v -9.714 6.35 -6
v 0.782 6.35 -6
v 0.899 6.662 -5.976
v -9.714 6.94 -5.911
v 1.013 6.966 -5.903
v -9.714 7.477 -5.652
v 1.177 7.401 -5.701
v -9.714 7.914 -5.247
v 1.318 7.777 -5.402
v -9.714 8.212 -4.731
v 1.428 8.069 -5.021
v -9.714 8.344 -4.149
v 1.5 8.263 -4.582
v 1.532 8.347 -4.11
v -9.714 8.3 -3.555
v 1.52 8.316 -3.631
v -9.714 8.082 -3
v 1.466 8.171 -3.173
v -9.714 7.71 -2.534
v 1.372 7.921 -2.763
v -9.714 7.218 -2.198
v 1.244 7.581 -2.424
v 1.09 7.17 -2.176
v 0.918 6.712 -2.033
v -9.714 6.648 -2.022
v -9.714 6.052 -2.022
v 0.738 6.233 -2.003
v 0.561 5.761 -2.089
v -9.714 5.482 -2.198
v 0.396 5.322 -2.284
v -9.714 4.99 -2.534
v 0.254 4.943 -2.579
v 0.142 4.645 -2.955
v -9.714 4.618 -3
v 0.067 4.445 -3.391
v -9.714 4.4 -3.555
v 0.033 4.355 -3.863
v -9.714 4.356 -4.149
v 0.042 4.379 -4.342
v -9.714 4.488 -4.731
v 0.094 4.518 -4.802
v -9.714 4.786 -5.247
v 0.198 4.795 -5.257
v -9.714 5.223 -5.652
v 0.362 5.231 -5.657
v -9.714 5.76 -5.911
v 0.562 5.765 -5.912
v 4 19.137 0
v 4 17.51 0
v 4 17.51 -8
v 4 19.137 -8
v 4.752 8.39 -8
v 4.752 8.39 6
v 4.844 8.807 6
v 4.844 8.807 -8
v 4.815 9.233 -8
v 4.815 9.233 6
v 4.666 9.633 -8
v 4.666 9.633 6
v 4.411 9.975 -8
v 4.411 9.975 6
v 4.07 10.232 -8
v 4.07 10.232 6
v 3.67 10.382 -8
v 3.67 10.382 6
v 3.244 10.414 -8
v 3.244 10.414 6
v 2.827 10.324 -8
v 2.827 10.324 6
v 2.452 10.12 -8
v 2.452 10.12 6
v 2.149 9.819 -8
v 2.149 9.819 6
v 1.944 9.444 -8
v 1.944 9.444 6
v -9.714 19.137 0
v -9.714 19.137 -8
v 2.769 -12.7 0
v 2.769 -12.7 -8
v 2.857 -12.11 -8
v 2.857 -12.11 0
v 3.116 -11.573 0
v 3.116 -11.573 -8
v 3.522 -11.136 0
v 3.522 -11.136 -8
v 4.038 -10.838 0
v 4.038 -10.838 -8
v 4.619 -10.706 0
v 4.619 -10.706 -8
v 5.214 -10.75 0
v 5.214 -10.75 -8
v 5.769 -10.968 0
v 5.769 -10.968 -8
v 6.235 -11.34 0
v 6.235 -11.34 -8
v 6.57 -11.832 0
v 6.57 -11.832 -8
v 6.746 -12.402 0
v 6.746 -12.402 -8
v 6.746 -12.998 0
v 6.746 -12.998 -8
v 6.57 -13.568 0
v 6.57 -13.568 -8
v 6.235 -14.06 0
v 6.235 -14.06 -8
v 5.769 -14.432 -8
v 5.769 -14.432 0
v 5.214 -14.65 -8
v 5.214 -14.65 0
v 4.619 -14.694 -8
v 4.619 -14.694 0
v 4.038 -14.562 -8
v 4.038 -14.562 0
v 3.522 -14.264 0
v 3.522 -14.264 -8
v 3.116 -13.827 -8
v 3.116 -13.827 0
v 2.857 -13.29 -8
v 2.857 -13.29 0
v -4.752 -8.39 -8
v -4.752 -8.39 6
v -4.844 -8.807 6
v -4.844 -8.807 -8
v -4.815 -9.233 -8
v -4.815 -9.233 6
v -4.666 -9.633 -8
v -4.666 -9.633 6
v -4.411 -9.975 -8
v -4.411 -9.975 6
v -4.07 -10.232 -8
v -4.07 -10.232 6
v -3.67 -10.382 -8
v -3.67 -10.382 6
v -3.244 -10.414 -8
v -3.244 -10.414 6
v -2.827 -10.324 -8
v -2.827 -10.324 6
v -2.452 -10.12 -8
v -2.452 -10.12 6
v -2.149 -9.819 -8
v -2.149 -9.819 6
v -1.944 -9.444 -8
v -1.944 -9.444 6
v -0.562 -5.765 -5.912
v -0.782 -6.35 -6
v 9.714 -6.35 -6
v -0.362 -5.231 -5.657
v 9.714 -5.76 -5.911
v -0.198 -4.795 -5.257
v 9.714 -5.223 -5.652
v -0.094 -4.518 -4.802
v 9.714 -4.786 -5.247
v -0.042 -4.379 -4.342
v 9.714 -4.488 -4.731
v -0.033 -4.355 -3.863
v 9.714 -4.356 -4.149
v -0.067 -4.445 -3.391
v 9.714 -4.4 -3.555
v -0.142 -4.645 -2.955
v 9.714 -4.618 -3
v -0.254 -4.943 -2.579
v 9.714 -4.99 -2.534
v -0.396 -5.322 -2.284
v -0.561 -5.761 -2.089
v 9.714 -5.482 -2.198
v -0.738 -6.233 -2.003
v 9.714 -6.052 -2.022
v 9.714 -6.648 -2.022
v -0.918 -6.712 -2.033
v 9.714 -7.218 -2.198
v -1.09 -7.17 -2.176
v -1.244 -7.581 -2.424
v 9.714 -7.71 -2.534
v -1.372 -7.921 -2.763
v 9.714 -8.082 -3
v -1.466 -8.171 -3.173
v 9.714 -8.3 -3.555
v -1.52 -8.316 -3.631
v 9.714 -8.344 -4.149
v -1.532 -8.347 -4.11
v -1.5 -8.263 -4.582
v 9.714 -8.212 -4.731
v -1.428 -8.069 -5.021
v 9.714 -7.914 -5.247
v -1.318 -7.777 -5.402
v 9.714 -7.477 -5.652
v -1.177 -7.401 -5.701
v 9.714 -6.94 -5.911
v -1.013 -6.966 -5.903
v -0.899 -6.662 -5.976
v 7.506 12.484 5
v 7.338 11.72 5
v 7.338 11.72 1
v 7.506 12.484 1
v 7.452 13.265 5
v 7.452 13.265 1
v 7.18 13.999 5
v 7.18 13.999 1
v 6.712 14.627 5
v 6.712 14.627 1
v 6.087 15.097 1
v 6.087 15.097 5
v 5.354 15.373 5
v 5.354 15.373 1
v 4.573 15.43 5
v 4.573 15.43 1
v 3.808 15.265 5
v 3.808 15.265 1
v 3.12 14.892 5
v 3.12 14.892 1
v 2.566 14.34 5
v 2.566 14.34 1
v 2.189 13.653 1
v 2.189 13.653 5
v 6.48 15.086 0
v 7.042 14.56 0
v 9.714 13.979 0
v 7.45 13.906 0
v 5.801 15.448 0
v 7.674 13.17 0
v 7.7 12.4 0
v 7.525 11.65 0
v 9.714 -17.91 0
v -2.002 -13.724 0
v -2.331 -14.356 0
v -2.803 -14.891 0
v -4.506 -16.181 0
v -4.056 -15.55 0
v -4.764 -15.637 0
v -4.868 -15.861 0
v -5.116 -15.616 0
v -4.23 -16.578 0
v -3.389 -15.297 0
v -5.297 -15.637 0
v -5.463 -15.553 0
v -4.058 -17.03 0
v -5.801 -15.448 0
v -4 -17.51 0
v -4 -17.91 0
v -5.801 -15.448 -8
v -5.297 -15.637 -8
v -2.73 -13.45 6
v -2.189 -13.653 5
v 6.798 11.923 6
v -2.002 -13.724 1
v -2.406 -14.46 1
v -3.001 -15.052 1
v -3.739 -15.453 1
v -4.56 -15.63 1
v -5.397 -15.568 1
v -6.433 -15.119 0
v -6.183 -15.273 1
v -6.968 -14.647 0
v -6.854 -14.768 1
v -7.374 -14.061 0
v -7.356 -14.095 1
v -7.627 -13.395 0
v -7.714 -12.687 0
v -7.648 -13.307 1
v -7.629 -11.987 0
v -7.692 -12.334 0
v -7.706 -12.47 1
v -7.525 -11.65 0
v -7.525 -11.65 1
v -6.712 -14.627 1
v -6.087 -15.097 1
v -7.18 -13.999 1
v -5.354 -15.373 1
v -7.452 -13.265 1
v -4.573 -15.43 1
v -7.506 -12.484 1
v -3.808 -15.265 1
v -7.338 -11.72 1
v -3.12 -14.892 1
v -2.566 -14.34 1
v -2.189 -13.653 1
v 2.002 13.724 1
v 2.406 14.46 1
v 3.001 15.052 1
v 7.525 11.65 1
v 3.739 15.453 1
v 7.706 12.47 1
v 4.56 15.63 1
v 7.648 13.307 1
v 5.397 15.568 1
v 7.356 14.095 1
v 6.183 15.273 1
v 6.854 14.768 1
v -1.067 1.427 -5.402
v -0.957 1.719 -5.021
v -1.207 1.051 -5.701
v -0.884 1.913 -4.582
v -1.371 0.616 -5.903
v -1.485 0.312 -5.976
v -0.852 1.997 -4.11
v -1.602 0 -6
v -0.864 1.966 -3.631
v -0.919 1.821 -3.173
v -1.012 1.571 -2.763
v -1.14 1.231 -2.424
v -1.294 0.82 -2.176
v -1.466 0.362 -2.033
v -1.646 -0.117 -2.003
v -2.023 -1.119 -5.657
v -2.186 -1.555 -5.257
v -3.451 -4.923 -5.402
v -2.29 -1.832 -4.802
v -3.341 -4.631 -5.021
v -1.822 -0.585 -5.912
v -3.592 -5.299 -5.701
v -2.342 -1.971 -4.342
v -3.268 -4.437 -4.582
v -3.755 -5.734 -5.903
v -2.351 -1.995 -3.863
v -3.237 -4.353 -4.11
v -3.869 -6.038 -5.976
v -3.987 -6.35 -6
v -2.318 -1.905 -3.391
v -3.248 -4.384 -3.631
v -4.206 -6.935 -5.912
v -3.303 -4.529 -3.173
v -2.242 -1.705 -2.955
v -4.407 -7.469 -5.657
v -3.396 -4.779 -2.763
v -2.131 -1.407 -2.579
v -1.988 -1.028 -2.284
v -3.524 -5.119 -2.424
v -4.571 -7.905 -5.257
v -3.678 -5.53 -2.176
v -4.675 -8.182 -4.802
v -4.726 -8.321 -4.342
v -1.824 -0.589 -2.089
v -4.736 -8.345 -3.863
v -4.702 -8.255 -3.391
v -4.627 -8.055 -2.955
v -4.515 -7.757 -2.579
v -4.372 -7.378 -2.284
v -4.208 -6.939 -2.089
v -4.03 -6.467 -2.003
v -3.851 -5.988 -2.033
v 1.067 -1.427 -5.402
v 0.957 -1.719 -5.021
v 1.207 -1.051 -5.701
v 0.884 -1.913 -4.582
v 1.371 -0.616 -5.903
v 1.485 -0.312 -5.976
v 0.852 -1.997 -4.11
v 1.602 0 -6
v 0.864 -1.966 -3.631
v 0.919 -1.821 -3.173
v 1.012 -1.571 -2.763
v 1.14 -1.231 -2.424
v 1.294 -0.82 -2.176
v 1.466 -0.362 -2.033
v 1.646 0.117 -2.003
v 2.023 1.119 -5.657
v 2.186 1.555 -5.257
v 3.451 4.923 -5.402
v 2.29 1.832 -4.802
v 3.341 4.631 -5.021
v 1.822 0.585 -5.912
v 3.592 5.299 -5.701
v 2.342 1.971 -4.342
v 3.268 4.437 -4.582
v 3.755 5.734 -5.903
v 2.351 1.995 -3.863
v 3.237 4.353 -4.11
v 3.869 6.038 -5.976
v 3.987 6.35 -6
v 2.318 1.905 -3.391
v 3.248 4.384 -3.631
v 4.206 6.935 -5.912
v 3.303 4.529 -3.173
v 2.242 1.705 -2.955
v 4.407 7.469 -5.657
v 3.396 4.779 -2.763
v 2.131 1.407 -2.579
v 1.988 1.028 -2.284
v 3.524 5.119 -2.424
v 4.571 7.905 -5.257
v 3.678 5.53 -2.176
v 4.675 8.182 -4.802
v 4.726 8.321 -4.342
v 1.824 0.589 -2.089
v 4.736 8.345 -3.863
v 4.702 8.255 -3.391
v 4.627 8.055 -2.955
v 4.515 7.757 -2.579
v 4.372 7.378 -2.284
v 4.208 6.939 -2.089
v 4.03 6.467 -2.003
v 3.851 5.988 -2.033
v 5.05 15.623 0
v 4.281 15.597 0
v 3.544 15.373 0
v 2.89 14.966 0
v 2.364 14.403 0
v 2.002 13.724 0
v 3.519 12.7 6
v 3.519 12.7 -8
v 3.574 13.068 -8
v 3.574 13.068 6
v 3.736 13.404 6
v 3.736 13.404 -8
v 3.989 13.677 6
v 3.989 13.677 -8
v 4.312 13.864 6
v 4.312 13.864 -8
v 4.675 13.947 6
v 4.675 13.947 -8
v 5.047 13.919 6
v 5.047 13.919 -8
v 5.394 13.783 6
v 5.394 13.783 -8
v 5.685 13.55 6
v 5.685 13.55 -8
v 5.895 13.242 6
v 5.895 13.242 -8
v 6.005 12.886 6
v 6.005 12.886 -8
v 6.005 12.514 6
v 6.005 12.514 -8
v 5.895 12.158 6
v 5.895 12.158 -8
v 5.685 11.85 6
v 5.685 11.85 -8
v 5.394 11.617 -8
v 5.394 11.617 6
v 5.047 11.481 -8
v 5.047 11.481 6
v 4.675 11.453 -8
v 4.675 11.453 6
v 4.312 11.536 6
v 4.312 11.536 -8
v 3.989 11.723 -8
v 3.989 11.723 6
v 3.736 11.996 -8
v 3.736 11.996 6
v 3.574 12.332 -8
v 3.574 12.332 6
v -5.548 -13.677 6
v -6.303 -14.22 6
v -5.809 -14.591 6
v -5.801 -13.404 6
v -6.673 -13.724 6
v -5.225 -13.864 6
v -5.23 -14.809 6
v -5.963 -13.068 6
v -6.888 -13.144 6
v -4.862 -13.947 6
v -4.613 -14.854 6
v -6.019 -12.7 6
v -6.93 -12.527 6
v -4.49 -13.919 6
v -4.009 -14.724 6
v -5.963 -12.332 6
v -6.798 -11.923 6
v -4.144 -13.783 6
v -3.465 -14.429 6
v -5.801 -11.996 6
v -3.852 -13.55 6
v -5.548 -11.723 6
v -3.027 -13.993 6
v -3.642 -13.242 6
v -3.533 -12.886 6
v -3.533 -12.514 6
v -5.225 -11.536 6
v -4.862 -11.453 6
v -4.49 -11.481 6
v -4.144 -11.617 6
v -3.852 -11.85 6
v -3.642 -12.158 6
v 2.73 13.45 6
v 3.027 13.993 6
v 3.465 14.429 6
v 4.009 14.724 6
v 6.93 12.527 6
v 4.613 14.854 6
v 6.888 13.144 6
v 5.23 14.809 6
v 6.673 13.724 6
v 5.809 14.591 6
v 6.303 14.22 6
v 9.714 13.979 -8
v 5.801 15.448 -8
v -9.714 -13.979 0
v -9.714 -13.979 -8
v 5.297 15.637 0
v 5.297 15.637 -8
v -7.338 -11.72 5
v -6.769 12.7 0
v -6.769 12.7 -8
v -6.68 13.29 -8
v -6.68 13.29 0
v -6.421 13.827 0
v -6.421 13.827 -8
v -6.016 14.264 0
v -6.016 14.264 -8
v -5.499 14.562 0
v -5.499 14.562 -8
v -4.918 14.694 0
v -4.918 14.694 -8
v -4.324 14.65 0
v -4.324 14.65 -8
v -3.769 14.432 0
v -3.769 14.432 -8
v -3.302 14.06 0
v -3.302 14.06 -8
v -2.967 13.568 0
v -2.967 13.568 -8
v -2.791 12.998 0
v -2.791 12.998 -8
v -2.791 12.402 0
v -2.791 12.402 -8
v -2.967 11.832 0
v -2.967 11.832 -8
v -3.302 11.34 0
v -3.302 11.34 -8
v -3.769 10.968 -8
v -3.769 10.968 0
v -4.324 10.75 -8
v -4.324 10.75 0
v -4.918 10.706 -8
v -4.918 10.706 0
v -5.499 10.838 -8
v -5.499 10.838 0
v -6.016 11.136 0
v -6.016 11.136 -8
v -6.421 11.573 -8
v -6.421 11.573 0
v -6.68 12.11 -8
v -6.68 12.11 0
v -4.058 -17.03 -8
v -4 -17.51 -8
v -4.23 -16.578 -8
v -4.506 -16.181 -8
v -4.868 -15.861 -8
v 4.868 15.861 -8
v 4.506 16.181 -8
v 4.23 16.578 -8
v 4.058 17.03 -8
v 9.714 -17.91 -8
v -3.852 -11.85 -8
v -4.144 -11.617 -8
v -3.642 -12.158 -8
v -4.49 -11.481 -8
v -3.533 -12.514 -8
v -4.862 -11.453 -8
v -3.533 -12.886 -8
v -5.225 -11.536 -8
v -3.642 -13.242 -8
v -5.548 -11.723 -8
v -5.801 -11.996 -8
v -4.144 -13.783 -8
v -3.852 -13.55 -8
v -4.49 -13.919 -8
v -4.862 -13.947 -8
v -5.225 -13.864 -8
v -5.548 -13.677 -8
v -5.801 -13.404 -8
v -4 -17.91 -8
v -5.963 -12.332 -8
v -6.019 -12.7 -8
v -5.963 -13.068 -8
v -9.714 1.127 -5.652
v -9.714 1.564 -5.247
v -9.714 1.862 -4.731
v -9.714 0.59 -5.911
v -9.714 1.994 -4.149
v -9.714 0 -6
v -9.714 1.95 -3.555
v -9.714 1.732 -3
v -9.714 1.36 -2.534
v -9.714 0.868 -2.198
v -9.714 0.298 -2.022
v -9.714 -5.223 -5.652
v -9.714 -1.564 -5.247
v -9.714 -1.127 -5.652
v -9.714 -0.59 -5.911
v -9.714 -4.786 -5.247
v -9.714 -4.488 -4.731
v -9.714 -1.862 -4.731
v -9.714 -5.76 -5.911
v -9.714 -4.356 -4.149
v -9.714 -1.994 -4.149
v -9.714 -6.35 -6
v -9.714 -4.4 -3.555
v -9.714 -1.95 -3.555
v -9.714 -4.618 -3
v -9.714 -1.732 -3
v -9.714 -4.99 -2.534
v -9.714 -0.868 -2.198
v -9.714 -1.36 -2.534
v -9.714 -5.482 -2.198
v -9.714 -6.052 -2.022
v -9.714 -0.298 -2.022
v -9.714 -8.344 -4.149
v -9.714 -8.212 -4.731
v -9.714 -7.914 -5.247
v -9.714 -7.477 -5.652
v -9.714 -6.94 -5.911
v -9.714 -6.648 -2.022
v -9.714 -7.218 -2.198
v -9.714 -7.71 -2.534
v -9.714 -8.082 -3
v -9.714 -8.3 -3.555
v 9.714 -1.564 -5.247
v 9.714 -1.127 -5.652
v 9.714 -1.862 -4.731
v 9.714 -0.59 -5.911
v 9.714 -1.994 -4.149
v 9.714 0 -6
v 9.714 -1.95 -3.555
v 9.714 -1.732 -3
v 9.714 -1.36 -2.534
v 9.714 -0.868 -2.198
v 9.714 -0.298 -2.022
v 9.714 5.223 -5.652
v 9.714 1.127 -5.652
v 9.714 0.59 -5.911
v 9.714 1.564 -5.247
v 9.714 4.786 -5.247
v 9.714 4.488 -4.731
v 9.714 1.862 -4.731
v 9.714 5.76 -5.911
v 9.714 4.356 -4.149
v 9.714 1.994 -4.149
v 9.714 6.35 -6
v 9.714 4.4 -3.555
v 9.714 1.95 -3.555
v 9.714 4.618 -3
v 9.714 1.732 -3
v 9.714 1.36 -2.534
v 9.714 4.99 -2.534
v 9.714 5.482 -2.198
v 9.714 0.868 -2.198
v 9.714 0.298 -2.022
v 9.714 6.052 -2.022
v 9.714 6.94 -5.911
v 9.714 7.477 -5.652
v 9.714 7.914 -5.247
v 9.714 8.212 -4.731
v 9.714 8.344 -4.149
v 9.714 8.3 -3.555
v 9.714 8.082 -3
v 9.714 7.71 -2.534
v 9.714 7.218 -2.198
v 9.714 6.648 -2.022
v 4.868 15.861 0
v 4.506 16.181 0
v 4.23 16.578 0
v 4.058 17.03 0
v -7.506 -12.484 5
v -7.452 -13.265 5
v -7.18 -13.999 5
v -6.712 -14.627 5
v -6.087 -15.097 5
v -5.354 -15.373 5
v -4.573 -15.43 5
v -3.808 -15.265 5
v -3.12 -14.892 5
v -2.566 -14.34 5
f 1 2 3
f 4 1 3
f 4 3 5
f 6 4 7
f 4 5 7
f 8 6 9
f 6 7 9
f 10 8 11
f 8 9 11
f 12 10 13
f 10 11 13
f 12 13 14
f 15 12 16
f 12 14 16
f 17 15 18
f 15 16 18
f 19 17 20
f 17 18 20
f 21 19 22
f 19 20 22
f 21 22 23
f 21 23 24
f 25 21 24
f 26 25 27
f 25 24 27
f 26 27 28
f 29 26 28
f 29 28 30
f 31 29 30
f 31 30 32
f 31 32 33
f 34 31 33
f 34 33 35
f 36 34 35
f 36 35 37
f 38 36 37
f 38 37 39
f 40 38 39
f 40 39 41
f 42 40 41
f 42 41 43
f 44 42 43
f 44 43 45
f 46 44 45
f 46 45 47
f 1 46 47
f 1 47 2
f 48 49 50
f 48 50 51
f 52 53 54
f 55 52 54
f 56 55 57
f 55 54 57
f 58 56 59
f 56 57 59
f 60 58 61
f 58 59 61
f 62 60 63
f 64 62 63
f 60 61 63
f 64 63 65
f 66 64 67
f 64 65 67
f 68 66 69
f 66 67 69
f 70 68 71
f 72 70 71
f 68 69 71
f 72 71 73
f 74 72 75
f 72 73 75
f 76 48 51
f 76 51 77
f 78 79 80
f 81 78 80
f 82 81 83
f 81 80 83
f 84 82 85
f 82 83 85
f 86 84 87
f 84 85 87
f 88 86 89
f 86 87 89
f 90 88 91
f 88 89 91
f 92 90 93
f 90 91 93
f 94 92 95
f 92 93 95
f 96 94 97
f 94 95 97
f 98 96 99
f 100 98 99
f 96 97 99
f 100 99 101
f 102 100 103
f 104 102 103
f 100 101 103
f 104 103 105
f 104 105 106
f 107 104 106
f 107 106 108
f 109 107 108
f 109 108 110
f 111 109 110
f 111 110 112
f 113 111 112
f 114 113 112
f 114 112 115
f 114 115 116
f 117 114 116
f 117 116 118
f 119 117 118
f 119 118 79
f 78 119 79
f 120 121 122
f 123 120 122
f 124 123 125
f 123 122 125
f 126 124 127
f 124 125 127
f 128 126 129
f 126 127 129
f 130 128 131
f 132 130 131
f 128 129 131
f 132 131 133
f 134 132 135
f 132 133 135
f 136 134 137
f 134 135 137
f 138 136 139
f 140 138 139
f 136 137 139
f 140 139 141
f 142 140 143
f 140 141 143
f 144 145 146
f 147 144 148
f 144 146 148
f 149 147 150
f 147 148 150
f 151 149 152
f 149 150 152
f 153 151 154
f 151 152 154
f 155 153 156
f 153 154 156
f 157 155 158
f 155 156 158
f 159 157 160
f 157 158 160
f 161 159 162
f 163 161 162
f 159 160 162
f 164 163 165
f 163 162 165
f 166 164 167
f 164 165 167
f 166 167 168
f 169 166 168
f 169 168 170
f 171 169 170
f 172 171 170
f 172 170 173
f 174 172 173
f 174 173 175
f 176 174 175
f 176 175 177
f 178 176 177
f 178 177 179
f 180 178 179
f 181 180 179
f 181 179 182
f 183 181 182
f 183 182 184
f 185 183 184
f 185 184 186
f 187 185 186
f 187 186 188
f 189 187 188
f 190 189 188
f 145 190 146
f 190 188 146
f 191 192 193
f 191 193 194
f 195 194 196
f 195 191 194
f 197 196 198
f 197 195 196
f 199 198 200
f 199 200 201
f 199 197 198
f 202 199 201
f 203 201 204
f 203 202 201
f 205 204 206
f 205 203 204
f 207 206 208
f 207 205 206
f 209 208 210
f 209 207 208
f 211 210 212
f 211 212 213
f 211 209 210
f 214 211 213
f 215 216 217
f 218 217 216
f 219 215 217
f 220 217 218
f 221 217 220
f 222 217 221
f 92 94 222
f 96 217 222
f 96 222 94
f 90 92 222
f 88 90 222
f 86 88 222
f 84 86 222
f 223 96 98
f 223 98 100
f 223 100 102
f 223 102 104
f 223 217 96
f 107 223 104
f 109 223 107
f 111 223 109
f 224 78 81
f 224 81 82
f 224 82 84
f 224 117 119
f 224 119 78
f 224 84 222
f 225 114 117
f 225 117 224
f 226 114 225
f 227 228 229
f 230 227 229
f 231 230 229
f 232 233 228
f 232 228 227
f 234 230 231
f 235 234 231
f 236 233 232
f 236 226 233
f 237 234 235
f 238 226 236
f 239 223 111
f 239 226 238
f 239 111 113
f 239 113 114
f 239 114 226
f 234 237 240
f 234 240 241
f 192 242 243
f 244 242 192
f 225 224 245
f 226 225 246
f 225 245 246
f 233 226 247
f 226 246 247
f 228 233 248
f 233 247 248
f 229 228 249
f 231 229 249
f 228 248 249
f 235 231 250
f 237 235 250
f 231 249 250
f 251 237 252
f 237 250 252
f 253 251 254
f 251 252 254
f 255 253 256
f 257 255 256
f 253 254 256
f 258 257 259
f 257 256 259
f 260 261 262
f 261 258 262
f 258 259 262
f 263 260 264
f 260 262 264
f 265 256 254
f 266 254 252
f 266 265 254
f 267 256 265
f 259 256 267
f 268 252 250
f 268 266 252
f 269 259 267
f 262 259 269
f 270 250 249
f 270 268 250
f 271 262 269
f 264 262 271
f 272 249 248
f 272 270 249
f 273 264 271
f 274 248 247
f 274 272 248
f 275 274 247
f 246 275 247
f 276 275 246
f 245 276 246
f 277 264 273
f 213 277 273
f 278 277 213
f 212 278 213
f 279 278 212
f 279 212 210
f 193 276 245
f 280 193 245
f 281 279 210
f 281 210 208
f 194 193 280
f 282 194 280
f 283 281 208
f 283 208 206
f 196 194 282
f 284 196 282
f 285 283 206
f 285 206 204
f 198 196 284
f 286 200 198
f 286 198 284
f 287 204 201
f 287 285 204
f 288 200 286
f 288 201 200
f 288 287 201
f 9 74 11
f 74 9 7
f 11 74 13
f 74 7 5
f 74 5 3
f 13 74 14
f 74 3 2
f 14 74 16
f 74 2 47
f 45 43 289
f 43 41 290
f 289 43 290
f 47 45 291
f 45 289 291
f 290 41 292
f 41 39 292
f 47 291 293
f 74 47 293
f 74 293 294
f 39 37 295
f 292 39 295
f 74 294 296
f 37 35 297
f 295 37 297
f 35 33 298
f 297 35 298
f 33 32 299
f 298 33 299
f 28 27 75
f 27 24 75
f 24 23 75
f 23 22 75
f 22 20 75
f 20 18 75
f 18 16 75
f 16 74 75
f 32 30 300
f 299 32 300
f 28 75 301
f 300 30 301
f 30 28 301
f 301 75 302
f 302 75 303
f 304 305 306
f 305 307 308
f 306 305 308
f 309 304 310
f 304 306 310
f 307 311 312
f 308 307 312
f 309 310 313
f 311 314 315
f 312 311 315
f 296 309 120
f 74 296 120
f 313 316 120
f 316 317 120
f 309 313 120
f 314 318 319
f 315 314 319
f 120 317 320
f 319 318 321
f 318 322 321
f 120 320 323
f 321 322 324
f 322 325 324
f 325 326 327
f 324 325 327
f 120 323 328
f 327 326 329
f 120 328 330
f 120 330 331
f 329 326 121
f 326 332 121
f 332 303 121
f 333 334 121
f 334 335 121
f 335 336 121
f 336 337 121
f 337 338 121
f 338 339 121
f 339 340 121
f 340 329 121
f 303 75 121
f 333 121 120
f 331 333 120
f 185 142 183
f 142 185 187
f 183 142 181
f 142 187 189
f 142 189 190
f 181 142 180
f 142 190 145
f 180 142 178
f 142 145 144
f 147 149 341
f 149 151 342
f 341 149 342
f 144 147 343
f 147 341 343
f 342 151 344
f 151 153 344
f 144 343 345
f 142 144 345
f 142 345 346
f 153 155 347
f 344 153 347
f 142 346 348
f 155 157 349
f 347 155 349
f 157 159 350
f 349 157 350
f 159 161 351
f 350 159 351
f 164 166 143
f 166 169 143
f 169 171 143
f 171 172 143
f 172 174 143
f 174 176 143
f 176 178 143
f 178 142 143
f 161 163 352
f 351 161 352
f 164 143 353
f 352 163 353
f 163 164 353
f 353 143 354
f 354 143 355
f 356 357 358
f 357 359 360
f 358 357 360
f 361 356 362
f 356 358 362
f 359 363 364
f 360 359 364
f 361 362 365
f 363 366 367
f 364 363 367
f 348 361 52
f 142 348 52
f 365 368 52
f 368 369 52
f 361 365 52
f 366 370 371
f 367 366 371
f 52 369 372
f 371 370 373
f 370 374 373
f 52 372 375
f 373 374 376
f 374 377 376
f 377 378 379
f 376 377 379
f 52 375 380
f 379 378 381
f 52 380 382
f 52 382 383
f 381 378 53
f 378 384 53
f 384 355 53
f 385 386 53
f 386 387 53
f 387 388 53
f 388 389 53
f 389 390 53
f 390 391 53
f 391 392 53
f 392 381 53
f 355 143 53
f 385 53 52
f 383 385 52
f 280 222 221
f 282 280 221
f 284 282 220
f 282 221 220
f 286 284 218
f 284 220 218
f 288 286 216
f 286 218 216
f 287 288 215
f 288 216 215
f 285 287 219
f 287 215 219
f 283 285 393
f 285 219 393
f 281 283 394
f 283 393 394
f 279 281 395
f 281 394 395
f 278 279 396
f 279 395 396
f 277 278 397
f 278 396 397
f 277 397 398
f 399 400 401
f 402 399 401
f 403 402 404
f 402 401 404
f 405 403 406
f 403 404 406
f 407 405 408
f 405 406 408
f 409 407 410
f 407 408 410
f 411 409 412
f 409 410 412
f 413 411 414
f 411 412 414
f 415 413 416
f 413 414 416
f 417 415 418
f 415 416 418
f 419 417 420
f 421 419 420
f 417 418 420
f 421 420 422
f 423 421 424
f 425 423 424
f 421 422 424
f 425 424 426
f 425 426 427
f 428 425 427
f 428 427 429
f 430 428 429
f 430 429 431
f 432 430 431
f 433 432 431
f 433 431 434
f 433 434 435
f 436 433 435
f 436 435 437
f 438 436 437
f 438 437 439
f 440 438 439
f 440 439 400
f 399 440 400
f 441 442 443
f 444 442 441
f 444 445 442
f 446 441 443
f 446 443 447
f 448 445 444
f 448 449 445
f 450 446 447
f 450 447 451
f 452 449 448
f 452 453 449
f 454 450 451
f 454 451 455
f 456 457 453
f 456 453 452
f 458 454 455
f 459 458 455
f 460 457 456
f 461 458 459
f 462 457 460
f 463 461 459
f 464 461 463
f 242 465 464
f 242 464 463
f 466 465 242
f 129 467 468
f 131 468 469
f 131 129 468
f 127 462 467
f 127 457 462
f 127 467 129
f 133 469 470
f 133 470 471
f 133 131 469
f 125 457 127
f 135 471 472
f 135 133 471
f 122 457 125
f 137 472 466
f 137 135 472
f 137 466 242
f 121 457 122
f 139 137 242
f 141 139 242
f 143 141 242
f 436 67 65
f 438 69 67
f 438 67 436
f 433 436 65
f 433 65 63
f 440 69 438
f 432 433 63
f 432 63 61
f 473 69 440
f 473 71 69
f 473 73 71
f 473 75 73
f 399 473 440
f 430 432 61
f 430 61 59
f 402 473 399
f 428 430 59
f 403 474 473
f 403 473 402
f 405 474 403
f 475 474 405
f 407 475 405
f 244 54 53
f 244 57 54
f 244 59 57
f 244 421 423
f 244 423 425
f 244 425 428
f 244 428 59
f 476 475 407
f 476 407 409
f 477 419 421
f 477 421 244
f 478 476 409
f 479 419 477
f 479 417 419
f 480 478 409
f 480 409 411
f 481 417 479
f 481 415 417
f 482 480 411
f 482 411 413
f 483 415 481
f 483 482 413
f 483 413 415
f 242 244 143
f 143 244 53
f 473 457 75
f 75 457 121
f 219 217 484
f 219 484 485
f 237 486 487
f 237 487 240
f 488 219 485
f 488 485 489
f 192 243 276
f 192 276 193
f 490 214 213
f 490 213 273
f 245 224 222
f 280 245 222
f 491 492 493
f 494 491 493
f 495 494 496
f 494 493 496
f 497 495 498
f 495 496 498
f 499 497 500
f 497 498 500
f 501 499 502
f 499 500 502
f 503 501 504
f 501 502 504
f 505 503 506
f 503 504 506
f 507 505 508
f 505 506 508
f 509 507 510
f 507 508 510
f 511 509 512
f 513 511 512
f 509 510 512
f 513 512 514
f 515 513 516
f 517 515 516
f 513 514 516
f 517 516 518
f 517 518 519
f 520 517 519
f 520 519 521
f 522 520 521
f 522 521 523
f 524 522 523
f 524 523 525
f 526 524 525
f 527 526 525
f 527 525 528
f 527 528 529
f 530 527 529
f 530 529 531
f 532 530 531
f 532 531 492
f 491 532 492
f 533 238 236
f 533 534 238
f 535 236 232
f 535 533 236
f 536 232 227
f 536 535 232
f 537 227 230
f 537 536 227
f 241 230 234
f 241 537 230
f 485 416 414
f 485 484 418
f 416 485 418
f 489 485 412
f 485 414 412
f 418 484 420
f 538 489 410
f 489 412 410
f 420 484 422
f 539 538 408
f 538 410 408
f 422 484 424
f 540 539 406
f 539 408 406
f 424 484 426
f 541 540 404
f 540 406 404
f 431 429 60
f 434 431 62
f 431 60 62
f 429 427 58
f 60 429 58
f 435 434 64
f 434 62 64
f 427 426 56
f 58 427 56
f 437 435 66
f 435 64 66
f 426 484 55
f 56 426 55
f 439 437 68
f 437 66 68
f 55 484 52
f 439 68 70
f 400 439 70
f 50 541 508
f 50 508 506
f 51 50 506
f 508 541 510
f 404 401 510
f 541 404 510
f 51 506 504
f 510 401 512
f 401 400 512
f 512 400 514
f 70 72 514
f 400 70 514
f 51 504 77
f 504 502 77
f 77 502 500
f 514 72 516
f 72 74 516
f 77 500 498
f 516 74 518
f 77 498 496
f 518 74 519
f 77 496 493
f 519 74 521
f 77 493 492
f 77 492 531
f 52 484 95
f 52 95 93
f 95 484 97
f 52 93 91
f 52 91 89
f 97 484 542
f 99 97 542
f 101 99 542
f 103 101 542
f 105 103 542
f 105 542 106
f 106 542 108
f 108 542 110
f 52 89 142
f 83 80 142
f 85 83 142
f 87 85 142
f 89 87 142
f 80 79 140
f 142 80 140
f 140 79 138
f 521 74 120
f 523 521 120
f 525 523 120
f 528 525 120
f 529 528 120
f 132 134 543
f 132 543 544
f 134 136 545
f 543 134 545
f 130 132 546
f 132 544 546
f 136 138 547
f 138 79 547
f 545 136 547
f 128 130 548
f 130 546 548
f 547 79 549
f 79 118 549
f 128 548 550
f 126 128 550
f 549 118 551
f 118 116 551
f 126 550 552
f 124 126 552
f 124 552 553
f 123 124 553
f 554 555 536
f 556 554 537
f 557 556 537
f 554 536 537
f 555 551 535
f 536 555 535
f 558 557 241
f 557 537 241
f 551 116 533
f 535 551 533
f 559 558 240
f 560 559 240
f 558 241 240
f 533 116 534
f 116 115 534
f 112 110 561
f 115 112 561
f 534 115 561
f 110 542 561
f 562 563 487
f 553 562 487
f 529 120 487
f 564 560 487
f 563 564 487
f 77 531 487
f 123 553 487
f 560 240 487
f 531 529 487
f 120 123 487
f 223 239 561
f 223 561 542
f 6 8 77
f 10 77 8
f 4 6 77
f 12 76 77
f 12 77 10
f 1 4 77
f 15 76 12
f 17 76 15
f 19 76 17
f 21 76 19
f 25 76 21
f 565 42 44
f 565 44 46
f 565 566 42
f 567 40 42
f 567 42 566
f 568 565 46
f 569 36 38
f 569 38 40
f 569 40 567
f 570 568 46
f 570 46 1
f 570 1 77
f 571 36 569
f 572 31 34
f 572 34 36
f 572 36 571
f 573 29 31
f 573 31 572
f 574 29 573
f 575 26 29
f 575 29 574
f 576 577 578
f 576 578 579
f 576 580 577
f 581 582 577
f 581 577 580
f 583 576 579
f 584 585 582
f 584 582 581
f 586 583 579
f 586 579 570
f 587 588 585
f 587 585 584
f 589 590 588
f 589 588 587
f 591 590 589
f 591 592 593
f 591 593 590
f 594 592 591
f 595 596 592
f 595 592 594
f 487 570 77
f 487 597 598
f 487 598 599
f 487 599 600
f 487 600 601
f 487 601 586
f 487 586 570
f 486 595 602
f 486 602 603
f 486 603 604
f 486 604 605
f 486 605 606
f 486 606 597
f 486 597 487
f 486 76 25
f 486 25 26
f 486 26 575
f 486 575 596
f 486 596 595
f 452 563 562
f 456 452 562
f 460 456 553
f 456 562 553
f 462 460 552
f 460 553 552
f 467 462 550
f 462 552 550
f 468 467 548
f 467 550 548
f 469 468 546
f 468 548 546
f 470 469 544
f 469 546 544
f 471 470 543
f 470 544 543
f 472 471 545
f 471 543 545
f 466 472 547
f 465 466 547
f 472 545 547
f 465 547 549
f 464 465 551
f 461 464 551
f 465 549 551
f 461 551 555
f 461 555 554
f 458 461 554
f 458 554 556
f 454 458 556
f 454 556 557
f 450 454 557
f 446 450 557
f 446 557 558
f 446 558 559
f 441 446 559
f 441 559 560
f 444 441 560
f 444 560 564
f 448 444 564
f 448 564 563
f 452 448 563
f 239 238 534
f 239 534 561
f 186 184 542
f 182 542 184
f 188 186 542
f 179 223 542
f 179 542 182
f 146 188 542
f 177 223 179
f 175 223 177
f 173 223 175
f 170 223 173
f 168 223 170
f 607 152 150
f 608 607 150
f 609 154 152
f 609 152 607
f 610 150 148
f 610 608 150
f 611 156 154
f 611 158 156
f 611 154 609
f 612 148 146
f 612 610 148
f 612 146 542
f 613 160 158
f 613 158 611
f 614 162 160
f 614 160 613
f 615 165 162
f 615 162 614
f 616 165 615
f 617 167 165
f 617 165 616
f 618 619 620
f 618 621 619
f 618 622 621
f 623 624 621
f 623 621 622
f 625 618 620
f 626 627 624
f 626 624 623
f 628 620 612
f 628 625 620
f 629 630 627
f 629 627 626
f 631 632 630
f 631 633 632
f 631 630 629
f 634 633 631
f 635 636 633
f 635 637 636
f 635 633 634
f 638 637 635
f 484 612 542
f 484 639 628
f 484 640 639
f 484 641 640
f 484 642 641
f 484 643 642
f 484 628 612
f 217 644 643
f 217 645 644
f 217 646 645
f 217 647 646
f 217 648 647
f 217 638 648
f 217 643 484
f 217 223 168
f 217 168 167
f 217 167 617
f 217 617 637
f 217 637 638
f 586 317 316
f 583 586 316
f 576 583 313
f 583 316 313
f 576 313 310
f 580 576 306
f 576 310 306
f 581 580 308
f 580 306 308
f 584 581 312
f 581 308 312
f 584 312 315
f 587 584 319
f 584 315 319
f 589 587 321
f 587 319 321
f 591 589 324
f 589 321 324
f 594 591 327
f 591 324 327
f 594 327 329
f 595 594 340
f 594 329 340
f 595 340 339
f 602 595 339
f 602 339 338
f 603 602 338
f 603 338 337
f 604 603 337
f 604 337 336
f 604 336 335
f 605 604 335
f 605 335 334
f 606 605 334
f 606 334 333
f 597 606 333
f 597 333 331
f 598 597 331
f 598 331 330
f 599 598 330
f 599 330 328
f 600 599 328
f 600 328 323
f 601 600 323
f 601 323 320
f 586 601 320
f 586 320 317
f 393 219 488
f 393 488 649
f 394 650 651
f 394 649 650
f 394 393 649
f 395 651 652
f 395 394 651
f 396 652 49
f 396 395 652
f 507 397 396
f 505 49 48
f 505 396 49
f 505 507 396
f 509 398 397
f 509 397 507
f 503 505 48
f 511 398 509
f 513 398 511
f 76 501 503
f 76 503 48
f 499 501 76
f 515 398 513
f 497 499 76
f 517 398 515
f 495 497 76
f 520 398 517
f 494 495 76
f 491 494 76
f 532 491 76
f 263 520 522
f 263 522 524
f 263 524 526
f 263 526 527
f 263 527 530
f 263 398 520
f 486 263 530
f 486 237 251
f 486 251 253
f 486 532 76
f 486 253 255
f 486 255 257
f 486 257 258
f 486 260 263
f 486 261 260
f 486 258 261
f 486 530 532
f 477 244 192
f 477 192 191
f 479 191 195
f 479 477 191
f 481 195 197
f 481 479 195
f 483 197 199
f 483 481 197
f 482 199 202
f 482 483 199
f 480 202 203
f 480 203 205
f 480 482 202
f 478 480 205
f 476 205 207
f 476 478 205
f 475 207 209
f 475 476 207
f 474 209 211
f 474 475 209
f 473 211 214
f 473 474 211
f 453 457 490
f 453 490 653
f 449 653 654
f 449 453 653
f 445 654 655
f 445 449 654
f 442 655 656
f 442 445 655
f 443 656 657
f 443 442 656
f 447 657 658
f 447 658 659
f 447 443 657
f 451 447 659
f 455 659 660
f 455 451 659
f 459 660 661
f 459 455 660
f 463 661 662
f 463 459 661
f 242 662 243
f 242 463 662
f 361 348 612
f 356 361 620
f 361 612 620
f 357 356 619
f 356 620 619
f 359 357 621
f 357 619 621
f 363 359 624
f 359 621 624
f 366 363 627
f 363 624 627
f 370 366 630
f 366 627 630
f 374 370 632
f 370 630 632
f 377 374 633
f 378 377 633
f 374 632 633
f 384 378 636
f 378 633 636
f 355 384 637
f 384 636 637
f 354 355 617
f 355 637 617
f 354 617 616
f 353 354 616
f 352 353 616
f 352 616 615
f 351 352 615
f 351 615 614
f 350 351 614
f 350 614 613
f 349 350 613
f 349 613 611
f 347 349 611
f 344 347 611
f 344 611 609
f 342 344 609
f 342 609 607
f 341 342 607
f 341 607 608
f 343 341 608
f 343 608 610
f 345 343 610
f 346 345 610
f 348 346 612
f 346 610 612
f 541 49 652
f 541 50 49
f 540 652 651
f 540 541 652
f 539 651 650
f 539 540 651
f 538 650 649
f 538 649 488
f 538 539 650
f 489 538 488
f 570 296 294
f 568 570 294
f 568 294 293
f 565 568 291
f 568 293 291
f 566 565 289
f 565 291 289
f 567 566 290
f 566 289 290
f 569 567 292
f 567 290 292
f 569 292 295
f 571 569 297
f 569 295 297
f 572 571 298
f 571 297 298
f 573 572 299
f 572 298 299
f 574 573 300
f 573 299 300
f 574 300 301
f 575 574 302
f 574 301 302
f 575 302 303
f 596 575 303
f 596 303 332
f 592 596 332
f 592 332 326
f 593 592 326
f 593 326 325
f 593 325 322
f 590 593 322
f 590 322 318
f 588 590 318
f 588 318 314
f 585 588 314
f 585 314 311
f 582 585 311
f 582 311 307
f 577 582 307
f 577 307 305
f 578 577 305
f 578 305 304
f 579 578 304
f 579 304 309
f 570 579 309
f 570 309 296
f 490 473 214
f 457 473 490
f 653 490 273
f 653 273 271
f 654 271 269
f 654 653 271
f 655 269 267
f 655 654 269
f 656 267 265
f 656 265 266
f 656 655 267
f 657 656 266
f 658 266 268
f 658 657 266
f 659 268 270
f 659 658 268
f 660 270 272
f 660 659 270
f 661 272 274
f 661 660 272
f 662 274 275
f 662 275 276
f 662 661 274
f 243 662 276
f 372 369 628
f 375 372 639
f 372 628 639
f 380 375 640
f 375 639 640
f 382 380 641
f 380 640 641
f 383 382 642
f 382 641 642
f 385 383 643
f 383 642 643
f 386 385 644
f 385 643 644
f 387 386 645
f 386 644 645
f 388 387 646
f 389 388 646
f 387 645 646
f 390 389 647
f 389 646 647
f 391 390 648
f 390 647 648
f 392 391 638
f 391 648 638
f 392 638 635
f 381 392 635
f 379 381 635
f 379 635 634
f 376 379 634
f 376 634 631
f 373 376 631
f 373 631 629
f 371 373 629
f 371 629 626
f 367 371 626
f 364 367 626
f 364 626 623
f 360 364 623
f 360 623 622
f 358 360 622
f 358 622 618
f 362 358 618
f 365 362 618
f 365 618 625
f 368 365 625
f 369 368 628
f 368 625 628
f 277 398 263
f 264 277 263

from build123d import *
from OCP.BRepFilletAPI import BRepFilletAPI_MakeChamfer

# Parameters (mm, degrees)
BOSS_EXTRUDE1_DEPTH      = 6
SKETCH2_W                = 15.427107808
SKETCH2_H                = 31.27334873
BOSS_EXTRUDE2_DEPTH      = 8
CUT_EXTRUDE1_DEPTH       = 23.360780376
CUT_EXTRUDE2_DEPTH       = 5
CHAMFER1_SIZE            = 1
CHAMFER1_SIZE2           = 0.577350269
CUT_EXTRUDE4_DEPTH       = 20.183443357
SKETCH17_W               = 2
SKETCH17_H               = 3.5
BOSS_EXTRUDE3_DEPTH      = 8
CIRPATTERN1_COUNT        = 2
FILLET3_R                = 2
SKETCH20_W               = 13.713553904
SKETCH20_H               = 1.226825257
CUT_EXTRUDE5_DEPTH       = 23.90339353
F_4_0_4_DIAMETER_HOLE3_D = 4
M3X0_5_TAPPED_HOLE1_D    = 2.5
F_4_0_4_DIAMETER_HOLE5_D = 4


with BuildPart() as part:
    # Sketch1 → Boss-Extrude1 (new body)
    with BuildSketch(Plane.XY):
        with BuildLine():
            Line((2.001816135, 13.723643263), (-7.525291673, -11.649705468))
            ThreePointArc((-7.525291673, -11.649705468), (-5.800522802, -15.448412135), (-2.001816135, -13.723643263))
            Line((-2.001816135, -13.723643263), (7.525291673, 11.649705468))
            ThreePointArc((7.525291673, 11.649705468), (5.800522802, 15.448412135), (2.001816135, 13.723643263))
        make_face()
    extrude(amount=BOSS_EXTRUDE1_DEPTH)

    # Sketch2 → Boss-Extrude2 (add)
    with BuildSketch(Plane(origin=(0, 0, 0), x_dir=(-1, 0, 0), z_dir=(0, 0, -1))):
        Rectangle(SKETCH2_W, SKETCH2_H)
    extrude(amount=BOSS_EXTRUDE2_DEPTH)

    # Sketch3 → Cut-Extrude1 (cut, through all)
    with BuildSketch(Plane.XY.offset(6)):
        with BuildLine():
            Line((1.943905795, 9.444408677), (-4.752452679, -8.389864035))
            ThreePointArc((-4.752452679, -8.389864035), (-3.875451558, -10.321409798), (-1.943905795, -9.444408677))
            Line((-1.943905795, -9.444408677), (4.752452679, 8.389864035))
            ThreePointArc((4.752452679, 8.389864035), (3.875451558, 10.321409798), (1.943905795, 9.444408677))
        make_face()
    extrude(amount=-CUT_EXTRUDE1_DEPTH, mode=Mode.SUBTRACT)

    # Sketch4 → Cut-Extrude2 (cut)
    with BuildSketch(Plane.XY.offset(6)):
        with BuildLine():
            Line((2.001816135, 13.723643263), (-7.525291673, -11.649705468))
            ThreePointArc((-7.525291673, -11.649705468), (-5.800522802, -15.448412135), (-2.001816135, -13.723643263))
            Line((-2.001816135, -13.723643263), (7.525291673, 11.649705468))
            ThreePointArc((7.525291673, 11.649705468), (5.800522802, 15.448412135), (2.001816135, 13.723643263))
        make_face()
        with BuildLine():
            Line((2.189052594, 13.653340287), (-7.338055214, -11.720008444))
            ThreePointArc((-7.338055214, -11.720008444), (-5.730219825, -15.261175676), (-2.189052594, -13.653340287))
            Line((-2.189052594, -13.653340287), (7.338055214, 11.720008444))
            ThreePointArc((7.338055214, 11.720008444), (5.730219825, 15.261175676), (2.189052594, 13.653340287))
        make_face(mode=Mode.SUBTRACT)
    extrude(amount=-CUT_EXTRUDE2_DEPTH, mode=Mode.SUBTRACT)

    # Chamfer1: one chamfer whose edges measure the first distance from different faces: ONE call of the kernel's chamfer builder (chamfer() names one face for all edges)
    chamfer1_edges_1 = [part.edges().sort_by_distance(p)[0] for p in [
        (2.57450131, -0.966665922, 6),
    ]]
    chamfer1_side_1 = [part.faces().sort_by_distance(p)[0] for p in [
        (2.57450131, -0.966665922, 3.5),
    ]]
    chamfer1_edges_2 = [part.edges().sort_by_distance(p)[0] for p in [
        (5.730219825, 15.261175676, 6),
    ]]
    chamfer1_side_2 = [part.faces().sort_by_distance(p)[0] for p in [
        (5.730219825, 15.261175676, 3.5),
    ]]
    chamfer1_edges_3 = [part.edges().sort_by_distance(p)[0] for p in [
        (-2.57450131, 0.966665922, 6),
    ]]
    chamfer1_side_3 = [part.faces().sort_by_distance(p)[0] for p in [
        (-2.57450131, 0.966665922, 3.5),
    ]]
    chamfer1_edges_4 = [part.edges().sort_by_distance(p)[0] for p in [
        (-5.730219825, -15.261175676, 6),
    ]]
    chamfer1_side_4 = [part.faces().sort_by_distance(p)[0] for p in [
        (-5.730219825, -15.261175676, 3.5),
    ]]
    chamfer1 = BRepFilletAPI_MakeChamfer(part.part.solid().wrapped)
    for e in chamfer1_edges_1:
        chamfer1.Add(CHAMFER1_SIZE, CHAMFER1_SIZE2, e.wrapped, chamfer1_side_1[0].wrapped)  # the first distance lies on this face
    for e in chamfer1_edges_2:
        chamfer1.Add(CHAMFER1_SIZE, CHAMFER1_SIZE2, e.wrapped, chamfer1_side_2[0].wrapped)  # the first distance lies on this face
    for e in chamfer1_edges_3:
        chamfer1.Add(CHAMFER1_SIZE, CHAMFER1_SIZE2, e.wrapped, chamfer1_side_3[0].wrapped)  # the first distance lies on this face
    for e in chamfer1_edges_4:
        chamfer1.Add(CHAMFER1_SIZE, CHAMFER1_SIZE2, e.wrapped, chamfer1_side_4[0].wrapped)  # the first distance lies on this face
    add(Compound.cast(chamfer1.Shape()), mode=Mode.REPLACE)

    # Sketch11 → Cut-Extrude4 (cut, through all)
    with BuildSketch(Plane.XY):
        with BuildLine():
            Line((4.763553904, 15.636674365), (7.713553904, 15.636674365))
            Line((7.713553904, 15.636674365), (7.713553904, 12.686674365))
            ThreePointArc((7.713553904, 12.686674365), (6.849518908, 14.77263937), (4.763553904, 15.636674365))
        make_face()
        with BuildLine():
            Line((-7.713553904, -12.686674365), (-7.713553904, -15.636674365))
            Line((-7.713553904, -15.636674365), (-4.763553904, -15.636674365))
            ThreePointArc((-4.763553904, -15.636674365), (-6.849518908, -14.77263937), (-7.713553904, -12.686674365))
        make_face()
    extrude(amount=-CUT_EXTRUDE4_DEPTH, mode=Mode.SUBTRACT)

    # Sketch17 → Boss-Extrude3 (add, through all)
    with BuildSketch(Plane.XY):
        with BuildLine():
            Line((7.713553904, 12.686674365), (7.713553904, -15.636674365))
            Line((7.713553904, -15.636674365), (9.713553904, -15.636674365))
            Line((9.713553904, -15.636674365), (9.713553904, 13.979159118))
            Line((9.713553904, 13.979159118), (5.800522802, 15.448412135))
            ThreePointArc((5.800522802, 15.448412135), (7.188585682, 14.366472233), (7.713553904, 12.686674365))
        make_face()
        with BuildLine():
            ThreePointArc((4.763553904, 15.636674365), (5.290513855, 15.589227243), (5.800522802, 15.448412135))
            Line((5.800522802, 15.448412135), (4, 16.12446696))
            Line((4, 16.12446696), (4, 19.136674365))
            Line((4, 19.136674365), (-7.713553904, 19.136674365))
            Line((-7.713553904, 19.136674365), (-7.713553904, 15.636674365))
            Line((-7.713553904, 15.636674365), (4.763553904, 15.636674365))
        make_face()
        with Locations((-8.713553904, 17.386674365)):
            Rectangle(SKETCH17_W, SKETCH17_H)
    boss_extrude3 = extrude(amount=-BOSS_EXTRUDE3_DEPTH)

    # CirPattern1: Boss-Extrude3 ×2 about axis
    cirpattern1_axis = Axis((0, 0, 0), (0, 0, 1))
    for i in range(1, CIRPATTERN1_COUNT):
        add(boss_extrude3.rotate(cirpattern1_axis, i * 360 / CIRPATTERN1_COUNT))

    # Fillet3
    fillet3_edges = [part.edges().sort_by_distance(p)[0] for p in [
        (4, 16.12446696, -4),
        (-4, -16.12446696, -4),
    ]]
    fillet(fillet3_edges, radius=FILLET3_R)

    # Sketch20 → Cut-Extrude5 (cut, through all)
    with BuildSketch(Plane.XY):
        with Locations((2.856776952, -18.523261737)):
            Rectangle(SKETCH20_W, SKETCH20_H)
    extrude(amount=-CUT_EXTRUDE5_DEPTH, mode=Mode.SUBTRACT)

    # 4.0 _4_ Diameter Hole3 (through all)
    with Locations(Plane(origin=(-9.713553904, 2.428457005, -0.24781288), x_dir=(0, 0, 1), z_dir=(-1, 0, 0))):
        with Locations((-3.75218712, 3.921542995), (-3.75218712, -8.778457005), (-3.75218712, -2.428457005)):
            Hole(F_4_0_4_DIAMETER_HOLE3_D / 2)

    # M3x0.5 Tapped Hole1 (through all)
    with Locations(Plane.XY.offset(6)):
        with Locations((-4.768557373, -12.7), (4.768557373, 12.7)):
            Hole(M3X0_5_TAPPED_HOLE1_D / 2)

    # 4.0 _4_ Diameter Hole5 (through all)
    with Locations(Plane.XY):
        with Locations((-4.768557373, 12.7), (4.768557373, -12.7)):
            Hole(F_4_0_4_DIAMETER_HOLE5_D / 2)


solid = part.part
